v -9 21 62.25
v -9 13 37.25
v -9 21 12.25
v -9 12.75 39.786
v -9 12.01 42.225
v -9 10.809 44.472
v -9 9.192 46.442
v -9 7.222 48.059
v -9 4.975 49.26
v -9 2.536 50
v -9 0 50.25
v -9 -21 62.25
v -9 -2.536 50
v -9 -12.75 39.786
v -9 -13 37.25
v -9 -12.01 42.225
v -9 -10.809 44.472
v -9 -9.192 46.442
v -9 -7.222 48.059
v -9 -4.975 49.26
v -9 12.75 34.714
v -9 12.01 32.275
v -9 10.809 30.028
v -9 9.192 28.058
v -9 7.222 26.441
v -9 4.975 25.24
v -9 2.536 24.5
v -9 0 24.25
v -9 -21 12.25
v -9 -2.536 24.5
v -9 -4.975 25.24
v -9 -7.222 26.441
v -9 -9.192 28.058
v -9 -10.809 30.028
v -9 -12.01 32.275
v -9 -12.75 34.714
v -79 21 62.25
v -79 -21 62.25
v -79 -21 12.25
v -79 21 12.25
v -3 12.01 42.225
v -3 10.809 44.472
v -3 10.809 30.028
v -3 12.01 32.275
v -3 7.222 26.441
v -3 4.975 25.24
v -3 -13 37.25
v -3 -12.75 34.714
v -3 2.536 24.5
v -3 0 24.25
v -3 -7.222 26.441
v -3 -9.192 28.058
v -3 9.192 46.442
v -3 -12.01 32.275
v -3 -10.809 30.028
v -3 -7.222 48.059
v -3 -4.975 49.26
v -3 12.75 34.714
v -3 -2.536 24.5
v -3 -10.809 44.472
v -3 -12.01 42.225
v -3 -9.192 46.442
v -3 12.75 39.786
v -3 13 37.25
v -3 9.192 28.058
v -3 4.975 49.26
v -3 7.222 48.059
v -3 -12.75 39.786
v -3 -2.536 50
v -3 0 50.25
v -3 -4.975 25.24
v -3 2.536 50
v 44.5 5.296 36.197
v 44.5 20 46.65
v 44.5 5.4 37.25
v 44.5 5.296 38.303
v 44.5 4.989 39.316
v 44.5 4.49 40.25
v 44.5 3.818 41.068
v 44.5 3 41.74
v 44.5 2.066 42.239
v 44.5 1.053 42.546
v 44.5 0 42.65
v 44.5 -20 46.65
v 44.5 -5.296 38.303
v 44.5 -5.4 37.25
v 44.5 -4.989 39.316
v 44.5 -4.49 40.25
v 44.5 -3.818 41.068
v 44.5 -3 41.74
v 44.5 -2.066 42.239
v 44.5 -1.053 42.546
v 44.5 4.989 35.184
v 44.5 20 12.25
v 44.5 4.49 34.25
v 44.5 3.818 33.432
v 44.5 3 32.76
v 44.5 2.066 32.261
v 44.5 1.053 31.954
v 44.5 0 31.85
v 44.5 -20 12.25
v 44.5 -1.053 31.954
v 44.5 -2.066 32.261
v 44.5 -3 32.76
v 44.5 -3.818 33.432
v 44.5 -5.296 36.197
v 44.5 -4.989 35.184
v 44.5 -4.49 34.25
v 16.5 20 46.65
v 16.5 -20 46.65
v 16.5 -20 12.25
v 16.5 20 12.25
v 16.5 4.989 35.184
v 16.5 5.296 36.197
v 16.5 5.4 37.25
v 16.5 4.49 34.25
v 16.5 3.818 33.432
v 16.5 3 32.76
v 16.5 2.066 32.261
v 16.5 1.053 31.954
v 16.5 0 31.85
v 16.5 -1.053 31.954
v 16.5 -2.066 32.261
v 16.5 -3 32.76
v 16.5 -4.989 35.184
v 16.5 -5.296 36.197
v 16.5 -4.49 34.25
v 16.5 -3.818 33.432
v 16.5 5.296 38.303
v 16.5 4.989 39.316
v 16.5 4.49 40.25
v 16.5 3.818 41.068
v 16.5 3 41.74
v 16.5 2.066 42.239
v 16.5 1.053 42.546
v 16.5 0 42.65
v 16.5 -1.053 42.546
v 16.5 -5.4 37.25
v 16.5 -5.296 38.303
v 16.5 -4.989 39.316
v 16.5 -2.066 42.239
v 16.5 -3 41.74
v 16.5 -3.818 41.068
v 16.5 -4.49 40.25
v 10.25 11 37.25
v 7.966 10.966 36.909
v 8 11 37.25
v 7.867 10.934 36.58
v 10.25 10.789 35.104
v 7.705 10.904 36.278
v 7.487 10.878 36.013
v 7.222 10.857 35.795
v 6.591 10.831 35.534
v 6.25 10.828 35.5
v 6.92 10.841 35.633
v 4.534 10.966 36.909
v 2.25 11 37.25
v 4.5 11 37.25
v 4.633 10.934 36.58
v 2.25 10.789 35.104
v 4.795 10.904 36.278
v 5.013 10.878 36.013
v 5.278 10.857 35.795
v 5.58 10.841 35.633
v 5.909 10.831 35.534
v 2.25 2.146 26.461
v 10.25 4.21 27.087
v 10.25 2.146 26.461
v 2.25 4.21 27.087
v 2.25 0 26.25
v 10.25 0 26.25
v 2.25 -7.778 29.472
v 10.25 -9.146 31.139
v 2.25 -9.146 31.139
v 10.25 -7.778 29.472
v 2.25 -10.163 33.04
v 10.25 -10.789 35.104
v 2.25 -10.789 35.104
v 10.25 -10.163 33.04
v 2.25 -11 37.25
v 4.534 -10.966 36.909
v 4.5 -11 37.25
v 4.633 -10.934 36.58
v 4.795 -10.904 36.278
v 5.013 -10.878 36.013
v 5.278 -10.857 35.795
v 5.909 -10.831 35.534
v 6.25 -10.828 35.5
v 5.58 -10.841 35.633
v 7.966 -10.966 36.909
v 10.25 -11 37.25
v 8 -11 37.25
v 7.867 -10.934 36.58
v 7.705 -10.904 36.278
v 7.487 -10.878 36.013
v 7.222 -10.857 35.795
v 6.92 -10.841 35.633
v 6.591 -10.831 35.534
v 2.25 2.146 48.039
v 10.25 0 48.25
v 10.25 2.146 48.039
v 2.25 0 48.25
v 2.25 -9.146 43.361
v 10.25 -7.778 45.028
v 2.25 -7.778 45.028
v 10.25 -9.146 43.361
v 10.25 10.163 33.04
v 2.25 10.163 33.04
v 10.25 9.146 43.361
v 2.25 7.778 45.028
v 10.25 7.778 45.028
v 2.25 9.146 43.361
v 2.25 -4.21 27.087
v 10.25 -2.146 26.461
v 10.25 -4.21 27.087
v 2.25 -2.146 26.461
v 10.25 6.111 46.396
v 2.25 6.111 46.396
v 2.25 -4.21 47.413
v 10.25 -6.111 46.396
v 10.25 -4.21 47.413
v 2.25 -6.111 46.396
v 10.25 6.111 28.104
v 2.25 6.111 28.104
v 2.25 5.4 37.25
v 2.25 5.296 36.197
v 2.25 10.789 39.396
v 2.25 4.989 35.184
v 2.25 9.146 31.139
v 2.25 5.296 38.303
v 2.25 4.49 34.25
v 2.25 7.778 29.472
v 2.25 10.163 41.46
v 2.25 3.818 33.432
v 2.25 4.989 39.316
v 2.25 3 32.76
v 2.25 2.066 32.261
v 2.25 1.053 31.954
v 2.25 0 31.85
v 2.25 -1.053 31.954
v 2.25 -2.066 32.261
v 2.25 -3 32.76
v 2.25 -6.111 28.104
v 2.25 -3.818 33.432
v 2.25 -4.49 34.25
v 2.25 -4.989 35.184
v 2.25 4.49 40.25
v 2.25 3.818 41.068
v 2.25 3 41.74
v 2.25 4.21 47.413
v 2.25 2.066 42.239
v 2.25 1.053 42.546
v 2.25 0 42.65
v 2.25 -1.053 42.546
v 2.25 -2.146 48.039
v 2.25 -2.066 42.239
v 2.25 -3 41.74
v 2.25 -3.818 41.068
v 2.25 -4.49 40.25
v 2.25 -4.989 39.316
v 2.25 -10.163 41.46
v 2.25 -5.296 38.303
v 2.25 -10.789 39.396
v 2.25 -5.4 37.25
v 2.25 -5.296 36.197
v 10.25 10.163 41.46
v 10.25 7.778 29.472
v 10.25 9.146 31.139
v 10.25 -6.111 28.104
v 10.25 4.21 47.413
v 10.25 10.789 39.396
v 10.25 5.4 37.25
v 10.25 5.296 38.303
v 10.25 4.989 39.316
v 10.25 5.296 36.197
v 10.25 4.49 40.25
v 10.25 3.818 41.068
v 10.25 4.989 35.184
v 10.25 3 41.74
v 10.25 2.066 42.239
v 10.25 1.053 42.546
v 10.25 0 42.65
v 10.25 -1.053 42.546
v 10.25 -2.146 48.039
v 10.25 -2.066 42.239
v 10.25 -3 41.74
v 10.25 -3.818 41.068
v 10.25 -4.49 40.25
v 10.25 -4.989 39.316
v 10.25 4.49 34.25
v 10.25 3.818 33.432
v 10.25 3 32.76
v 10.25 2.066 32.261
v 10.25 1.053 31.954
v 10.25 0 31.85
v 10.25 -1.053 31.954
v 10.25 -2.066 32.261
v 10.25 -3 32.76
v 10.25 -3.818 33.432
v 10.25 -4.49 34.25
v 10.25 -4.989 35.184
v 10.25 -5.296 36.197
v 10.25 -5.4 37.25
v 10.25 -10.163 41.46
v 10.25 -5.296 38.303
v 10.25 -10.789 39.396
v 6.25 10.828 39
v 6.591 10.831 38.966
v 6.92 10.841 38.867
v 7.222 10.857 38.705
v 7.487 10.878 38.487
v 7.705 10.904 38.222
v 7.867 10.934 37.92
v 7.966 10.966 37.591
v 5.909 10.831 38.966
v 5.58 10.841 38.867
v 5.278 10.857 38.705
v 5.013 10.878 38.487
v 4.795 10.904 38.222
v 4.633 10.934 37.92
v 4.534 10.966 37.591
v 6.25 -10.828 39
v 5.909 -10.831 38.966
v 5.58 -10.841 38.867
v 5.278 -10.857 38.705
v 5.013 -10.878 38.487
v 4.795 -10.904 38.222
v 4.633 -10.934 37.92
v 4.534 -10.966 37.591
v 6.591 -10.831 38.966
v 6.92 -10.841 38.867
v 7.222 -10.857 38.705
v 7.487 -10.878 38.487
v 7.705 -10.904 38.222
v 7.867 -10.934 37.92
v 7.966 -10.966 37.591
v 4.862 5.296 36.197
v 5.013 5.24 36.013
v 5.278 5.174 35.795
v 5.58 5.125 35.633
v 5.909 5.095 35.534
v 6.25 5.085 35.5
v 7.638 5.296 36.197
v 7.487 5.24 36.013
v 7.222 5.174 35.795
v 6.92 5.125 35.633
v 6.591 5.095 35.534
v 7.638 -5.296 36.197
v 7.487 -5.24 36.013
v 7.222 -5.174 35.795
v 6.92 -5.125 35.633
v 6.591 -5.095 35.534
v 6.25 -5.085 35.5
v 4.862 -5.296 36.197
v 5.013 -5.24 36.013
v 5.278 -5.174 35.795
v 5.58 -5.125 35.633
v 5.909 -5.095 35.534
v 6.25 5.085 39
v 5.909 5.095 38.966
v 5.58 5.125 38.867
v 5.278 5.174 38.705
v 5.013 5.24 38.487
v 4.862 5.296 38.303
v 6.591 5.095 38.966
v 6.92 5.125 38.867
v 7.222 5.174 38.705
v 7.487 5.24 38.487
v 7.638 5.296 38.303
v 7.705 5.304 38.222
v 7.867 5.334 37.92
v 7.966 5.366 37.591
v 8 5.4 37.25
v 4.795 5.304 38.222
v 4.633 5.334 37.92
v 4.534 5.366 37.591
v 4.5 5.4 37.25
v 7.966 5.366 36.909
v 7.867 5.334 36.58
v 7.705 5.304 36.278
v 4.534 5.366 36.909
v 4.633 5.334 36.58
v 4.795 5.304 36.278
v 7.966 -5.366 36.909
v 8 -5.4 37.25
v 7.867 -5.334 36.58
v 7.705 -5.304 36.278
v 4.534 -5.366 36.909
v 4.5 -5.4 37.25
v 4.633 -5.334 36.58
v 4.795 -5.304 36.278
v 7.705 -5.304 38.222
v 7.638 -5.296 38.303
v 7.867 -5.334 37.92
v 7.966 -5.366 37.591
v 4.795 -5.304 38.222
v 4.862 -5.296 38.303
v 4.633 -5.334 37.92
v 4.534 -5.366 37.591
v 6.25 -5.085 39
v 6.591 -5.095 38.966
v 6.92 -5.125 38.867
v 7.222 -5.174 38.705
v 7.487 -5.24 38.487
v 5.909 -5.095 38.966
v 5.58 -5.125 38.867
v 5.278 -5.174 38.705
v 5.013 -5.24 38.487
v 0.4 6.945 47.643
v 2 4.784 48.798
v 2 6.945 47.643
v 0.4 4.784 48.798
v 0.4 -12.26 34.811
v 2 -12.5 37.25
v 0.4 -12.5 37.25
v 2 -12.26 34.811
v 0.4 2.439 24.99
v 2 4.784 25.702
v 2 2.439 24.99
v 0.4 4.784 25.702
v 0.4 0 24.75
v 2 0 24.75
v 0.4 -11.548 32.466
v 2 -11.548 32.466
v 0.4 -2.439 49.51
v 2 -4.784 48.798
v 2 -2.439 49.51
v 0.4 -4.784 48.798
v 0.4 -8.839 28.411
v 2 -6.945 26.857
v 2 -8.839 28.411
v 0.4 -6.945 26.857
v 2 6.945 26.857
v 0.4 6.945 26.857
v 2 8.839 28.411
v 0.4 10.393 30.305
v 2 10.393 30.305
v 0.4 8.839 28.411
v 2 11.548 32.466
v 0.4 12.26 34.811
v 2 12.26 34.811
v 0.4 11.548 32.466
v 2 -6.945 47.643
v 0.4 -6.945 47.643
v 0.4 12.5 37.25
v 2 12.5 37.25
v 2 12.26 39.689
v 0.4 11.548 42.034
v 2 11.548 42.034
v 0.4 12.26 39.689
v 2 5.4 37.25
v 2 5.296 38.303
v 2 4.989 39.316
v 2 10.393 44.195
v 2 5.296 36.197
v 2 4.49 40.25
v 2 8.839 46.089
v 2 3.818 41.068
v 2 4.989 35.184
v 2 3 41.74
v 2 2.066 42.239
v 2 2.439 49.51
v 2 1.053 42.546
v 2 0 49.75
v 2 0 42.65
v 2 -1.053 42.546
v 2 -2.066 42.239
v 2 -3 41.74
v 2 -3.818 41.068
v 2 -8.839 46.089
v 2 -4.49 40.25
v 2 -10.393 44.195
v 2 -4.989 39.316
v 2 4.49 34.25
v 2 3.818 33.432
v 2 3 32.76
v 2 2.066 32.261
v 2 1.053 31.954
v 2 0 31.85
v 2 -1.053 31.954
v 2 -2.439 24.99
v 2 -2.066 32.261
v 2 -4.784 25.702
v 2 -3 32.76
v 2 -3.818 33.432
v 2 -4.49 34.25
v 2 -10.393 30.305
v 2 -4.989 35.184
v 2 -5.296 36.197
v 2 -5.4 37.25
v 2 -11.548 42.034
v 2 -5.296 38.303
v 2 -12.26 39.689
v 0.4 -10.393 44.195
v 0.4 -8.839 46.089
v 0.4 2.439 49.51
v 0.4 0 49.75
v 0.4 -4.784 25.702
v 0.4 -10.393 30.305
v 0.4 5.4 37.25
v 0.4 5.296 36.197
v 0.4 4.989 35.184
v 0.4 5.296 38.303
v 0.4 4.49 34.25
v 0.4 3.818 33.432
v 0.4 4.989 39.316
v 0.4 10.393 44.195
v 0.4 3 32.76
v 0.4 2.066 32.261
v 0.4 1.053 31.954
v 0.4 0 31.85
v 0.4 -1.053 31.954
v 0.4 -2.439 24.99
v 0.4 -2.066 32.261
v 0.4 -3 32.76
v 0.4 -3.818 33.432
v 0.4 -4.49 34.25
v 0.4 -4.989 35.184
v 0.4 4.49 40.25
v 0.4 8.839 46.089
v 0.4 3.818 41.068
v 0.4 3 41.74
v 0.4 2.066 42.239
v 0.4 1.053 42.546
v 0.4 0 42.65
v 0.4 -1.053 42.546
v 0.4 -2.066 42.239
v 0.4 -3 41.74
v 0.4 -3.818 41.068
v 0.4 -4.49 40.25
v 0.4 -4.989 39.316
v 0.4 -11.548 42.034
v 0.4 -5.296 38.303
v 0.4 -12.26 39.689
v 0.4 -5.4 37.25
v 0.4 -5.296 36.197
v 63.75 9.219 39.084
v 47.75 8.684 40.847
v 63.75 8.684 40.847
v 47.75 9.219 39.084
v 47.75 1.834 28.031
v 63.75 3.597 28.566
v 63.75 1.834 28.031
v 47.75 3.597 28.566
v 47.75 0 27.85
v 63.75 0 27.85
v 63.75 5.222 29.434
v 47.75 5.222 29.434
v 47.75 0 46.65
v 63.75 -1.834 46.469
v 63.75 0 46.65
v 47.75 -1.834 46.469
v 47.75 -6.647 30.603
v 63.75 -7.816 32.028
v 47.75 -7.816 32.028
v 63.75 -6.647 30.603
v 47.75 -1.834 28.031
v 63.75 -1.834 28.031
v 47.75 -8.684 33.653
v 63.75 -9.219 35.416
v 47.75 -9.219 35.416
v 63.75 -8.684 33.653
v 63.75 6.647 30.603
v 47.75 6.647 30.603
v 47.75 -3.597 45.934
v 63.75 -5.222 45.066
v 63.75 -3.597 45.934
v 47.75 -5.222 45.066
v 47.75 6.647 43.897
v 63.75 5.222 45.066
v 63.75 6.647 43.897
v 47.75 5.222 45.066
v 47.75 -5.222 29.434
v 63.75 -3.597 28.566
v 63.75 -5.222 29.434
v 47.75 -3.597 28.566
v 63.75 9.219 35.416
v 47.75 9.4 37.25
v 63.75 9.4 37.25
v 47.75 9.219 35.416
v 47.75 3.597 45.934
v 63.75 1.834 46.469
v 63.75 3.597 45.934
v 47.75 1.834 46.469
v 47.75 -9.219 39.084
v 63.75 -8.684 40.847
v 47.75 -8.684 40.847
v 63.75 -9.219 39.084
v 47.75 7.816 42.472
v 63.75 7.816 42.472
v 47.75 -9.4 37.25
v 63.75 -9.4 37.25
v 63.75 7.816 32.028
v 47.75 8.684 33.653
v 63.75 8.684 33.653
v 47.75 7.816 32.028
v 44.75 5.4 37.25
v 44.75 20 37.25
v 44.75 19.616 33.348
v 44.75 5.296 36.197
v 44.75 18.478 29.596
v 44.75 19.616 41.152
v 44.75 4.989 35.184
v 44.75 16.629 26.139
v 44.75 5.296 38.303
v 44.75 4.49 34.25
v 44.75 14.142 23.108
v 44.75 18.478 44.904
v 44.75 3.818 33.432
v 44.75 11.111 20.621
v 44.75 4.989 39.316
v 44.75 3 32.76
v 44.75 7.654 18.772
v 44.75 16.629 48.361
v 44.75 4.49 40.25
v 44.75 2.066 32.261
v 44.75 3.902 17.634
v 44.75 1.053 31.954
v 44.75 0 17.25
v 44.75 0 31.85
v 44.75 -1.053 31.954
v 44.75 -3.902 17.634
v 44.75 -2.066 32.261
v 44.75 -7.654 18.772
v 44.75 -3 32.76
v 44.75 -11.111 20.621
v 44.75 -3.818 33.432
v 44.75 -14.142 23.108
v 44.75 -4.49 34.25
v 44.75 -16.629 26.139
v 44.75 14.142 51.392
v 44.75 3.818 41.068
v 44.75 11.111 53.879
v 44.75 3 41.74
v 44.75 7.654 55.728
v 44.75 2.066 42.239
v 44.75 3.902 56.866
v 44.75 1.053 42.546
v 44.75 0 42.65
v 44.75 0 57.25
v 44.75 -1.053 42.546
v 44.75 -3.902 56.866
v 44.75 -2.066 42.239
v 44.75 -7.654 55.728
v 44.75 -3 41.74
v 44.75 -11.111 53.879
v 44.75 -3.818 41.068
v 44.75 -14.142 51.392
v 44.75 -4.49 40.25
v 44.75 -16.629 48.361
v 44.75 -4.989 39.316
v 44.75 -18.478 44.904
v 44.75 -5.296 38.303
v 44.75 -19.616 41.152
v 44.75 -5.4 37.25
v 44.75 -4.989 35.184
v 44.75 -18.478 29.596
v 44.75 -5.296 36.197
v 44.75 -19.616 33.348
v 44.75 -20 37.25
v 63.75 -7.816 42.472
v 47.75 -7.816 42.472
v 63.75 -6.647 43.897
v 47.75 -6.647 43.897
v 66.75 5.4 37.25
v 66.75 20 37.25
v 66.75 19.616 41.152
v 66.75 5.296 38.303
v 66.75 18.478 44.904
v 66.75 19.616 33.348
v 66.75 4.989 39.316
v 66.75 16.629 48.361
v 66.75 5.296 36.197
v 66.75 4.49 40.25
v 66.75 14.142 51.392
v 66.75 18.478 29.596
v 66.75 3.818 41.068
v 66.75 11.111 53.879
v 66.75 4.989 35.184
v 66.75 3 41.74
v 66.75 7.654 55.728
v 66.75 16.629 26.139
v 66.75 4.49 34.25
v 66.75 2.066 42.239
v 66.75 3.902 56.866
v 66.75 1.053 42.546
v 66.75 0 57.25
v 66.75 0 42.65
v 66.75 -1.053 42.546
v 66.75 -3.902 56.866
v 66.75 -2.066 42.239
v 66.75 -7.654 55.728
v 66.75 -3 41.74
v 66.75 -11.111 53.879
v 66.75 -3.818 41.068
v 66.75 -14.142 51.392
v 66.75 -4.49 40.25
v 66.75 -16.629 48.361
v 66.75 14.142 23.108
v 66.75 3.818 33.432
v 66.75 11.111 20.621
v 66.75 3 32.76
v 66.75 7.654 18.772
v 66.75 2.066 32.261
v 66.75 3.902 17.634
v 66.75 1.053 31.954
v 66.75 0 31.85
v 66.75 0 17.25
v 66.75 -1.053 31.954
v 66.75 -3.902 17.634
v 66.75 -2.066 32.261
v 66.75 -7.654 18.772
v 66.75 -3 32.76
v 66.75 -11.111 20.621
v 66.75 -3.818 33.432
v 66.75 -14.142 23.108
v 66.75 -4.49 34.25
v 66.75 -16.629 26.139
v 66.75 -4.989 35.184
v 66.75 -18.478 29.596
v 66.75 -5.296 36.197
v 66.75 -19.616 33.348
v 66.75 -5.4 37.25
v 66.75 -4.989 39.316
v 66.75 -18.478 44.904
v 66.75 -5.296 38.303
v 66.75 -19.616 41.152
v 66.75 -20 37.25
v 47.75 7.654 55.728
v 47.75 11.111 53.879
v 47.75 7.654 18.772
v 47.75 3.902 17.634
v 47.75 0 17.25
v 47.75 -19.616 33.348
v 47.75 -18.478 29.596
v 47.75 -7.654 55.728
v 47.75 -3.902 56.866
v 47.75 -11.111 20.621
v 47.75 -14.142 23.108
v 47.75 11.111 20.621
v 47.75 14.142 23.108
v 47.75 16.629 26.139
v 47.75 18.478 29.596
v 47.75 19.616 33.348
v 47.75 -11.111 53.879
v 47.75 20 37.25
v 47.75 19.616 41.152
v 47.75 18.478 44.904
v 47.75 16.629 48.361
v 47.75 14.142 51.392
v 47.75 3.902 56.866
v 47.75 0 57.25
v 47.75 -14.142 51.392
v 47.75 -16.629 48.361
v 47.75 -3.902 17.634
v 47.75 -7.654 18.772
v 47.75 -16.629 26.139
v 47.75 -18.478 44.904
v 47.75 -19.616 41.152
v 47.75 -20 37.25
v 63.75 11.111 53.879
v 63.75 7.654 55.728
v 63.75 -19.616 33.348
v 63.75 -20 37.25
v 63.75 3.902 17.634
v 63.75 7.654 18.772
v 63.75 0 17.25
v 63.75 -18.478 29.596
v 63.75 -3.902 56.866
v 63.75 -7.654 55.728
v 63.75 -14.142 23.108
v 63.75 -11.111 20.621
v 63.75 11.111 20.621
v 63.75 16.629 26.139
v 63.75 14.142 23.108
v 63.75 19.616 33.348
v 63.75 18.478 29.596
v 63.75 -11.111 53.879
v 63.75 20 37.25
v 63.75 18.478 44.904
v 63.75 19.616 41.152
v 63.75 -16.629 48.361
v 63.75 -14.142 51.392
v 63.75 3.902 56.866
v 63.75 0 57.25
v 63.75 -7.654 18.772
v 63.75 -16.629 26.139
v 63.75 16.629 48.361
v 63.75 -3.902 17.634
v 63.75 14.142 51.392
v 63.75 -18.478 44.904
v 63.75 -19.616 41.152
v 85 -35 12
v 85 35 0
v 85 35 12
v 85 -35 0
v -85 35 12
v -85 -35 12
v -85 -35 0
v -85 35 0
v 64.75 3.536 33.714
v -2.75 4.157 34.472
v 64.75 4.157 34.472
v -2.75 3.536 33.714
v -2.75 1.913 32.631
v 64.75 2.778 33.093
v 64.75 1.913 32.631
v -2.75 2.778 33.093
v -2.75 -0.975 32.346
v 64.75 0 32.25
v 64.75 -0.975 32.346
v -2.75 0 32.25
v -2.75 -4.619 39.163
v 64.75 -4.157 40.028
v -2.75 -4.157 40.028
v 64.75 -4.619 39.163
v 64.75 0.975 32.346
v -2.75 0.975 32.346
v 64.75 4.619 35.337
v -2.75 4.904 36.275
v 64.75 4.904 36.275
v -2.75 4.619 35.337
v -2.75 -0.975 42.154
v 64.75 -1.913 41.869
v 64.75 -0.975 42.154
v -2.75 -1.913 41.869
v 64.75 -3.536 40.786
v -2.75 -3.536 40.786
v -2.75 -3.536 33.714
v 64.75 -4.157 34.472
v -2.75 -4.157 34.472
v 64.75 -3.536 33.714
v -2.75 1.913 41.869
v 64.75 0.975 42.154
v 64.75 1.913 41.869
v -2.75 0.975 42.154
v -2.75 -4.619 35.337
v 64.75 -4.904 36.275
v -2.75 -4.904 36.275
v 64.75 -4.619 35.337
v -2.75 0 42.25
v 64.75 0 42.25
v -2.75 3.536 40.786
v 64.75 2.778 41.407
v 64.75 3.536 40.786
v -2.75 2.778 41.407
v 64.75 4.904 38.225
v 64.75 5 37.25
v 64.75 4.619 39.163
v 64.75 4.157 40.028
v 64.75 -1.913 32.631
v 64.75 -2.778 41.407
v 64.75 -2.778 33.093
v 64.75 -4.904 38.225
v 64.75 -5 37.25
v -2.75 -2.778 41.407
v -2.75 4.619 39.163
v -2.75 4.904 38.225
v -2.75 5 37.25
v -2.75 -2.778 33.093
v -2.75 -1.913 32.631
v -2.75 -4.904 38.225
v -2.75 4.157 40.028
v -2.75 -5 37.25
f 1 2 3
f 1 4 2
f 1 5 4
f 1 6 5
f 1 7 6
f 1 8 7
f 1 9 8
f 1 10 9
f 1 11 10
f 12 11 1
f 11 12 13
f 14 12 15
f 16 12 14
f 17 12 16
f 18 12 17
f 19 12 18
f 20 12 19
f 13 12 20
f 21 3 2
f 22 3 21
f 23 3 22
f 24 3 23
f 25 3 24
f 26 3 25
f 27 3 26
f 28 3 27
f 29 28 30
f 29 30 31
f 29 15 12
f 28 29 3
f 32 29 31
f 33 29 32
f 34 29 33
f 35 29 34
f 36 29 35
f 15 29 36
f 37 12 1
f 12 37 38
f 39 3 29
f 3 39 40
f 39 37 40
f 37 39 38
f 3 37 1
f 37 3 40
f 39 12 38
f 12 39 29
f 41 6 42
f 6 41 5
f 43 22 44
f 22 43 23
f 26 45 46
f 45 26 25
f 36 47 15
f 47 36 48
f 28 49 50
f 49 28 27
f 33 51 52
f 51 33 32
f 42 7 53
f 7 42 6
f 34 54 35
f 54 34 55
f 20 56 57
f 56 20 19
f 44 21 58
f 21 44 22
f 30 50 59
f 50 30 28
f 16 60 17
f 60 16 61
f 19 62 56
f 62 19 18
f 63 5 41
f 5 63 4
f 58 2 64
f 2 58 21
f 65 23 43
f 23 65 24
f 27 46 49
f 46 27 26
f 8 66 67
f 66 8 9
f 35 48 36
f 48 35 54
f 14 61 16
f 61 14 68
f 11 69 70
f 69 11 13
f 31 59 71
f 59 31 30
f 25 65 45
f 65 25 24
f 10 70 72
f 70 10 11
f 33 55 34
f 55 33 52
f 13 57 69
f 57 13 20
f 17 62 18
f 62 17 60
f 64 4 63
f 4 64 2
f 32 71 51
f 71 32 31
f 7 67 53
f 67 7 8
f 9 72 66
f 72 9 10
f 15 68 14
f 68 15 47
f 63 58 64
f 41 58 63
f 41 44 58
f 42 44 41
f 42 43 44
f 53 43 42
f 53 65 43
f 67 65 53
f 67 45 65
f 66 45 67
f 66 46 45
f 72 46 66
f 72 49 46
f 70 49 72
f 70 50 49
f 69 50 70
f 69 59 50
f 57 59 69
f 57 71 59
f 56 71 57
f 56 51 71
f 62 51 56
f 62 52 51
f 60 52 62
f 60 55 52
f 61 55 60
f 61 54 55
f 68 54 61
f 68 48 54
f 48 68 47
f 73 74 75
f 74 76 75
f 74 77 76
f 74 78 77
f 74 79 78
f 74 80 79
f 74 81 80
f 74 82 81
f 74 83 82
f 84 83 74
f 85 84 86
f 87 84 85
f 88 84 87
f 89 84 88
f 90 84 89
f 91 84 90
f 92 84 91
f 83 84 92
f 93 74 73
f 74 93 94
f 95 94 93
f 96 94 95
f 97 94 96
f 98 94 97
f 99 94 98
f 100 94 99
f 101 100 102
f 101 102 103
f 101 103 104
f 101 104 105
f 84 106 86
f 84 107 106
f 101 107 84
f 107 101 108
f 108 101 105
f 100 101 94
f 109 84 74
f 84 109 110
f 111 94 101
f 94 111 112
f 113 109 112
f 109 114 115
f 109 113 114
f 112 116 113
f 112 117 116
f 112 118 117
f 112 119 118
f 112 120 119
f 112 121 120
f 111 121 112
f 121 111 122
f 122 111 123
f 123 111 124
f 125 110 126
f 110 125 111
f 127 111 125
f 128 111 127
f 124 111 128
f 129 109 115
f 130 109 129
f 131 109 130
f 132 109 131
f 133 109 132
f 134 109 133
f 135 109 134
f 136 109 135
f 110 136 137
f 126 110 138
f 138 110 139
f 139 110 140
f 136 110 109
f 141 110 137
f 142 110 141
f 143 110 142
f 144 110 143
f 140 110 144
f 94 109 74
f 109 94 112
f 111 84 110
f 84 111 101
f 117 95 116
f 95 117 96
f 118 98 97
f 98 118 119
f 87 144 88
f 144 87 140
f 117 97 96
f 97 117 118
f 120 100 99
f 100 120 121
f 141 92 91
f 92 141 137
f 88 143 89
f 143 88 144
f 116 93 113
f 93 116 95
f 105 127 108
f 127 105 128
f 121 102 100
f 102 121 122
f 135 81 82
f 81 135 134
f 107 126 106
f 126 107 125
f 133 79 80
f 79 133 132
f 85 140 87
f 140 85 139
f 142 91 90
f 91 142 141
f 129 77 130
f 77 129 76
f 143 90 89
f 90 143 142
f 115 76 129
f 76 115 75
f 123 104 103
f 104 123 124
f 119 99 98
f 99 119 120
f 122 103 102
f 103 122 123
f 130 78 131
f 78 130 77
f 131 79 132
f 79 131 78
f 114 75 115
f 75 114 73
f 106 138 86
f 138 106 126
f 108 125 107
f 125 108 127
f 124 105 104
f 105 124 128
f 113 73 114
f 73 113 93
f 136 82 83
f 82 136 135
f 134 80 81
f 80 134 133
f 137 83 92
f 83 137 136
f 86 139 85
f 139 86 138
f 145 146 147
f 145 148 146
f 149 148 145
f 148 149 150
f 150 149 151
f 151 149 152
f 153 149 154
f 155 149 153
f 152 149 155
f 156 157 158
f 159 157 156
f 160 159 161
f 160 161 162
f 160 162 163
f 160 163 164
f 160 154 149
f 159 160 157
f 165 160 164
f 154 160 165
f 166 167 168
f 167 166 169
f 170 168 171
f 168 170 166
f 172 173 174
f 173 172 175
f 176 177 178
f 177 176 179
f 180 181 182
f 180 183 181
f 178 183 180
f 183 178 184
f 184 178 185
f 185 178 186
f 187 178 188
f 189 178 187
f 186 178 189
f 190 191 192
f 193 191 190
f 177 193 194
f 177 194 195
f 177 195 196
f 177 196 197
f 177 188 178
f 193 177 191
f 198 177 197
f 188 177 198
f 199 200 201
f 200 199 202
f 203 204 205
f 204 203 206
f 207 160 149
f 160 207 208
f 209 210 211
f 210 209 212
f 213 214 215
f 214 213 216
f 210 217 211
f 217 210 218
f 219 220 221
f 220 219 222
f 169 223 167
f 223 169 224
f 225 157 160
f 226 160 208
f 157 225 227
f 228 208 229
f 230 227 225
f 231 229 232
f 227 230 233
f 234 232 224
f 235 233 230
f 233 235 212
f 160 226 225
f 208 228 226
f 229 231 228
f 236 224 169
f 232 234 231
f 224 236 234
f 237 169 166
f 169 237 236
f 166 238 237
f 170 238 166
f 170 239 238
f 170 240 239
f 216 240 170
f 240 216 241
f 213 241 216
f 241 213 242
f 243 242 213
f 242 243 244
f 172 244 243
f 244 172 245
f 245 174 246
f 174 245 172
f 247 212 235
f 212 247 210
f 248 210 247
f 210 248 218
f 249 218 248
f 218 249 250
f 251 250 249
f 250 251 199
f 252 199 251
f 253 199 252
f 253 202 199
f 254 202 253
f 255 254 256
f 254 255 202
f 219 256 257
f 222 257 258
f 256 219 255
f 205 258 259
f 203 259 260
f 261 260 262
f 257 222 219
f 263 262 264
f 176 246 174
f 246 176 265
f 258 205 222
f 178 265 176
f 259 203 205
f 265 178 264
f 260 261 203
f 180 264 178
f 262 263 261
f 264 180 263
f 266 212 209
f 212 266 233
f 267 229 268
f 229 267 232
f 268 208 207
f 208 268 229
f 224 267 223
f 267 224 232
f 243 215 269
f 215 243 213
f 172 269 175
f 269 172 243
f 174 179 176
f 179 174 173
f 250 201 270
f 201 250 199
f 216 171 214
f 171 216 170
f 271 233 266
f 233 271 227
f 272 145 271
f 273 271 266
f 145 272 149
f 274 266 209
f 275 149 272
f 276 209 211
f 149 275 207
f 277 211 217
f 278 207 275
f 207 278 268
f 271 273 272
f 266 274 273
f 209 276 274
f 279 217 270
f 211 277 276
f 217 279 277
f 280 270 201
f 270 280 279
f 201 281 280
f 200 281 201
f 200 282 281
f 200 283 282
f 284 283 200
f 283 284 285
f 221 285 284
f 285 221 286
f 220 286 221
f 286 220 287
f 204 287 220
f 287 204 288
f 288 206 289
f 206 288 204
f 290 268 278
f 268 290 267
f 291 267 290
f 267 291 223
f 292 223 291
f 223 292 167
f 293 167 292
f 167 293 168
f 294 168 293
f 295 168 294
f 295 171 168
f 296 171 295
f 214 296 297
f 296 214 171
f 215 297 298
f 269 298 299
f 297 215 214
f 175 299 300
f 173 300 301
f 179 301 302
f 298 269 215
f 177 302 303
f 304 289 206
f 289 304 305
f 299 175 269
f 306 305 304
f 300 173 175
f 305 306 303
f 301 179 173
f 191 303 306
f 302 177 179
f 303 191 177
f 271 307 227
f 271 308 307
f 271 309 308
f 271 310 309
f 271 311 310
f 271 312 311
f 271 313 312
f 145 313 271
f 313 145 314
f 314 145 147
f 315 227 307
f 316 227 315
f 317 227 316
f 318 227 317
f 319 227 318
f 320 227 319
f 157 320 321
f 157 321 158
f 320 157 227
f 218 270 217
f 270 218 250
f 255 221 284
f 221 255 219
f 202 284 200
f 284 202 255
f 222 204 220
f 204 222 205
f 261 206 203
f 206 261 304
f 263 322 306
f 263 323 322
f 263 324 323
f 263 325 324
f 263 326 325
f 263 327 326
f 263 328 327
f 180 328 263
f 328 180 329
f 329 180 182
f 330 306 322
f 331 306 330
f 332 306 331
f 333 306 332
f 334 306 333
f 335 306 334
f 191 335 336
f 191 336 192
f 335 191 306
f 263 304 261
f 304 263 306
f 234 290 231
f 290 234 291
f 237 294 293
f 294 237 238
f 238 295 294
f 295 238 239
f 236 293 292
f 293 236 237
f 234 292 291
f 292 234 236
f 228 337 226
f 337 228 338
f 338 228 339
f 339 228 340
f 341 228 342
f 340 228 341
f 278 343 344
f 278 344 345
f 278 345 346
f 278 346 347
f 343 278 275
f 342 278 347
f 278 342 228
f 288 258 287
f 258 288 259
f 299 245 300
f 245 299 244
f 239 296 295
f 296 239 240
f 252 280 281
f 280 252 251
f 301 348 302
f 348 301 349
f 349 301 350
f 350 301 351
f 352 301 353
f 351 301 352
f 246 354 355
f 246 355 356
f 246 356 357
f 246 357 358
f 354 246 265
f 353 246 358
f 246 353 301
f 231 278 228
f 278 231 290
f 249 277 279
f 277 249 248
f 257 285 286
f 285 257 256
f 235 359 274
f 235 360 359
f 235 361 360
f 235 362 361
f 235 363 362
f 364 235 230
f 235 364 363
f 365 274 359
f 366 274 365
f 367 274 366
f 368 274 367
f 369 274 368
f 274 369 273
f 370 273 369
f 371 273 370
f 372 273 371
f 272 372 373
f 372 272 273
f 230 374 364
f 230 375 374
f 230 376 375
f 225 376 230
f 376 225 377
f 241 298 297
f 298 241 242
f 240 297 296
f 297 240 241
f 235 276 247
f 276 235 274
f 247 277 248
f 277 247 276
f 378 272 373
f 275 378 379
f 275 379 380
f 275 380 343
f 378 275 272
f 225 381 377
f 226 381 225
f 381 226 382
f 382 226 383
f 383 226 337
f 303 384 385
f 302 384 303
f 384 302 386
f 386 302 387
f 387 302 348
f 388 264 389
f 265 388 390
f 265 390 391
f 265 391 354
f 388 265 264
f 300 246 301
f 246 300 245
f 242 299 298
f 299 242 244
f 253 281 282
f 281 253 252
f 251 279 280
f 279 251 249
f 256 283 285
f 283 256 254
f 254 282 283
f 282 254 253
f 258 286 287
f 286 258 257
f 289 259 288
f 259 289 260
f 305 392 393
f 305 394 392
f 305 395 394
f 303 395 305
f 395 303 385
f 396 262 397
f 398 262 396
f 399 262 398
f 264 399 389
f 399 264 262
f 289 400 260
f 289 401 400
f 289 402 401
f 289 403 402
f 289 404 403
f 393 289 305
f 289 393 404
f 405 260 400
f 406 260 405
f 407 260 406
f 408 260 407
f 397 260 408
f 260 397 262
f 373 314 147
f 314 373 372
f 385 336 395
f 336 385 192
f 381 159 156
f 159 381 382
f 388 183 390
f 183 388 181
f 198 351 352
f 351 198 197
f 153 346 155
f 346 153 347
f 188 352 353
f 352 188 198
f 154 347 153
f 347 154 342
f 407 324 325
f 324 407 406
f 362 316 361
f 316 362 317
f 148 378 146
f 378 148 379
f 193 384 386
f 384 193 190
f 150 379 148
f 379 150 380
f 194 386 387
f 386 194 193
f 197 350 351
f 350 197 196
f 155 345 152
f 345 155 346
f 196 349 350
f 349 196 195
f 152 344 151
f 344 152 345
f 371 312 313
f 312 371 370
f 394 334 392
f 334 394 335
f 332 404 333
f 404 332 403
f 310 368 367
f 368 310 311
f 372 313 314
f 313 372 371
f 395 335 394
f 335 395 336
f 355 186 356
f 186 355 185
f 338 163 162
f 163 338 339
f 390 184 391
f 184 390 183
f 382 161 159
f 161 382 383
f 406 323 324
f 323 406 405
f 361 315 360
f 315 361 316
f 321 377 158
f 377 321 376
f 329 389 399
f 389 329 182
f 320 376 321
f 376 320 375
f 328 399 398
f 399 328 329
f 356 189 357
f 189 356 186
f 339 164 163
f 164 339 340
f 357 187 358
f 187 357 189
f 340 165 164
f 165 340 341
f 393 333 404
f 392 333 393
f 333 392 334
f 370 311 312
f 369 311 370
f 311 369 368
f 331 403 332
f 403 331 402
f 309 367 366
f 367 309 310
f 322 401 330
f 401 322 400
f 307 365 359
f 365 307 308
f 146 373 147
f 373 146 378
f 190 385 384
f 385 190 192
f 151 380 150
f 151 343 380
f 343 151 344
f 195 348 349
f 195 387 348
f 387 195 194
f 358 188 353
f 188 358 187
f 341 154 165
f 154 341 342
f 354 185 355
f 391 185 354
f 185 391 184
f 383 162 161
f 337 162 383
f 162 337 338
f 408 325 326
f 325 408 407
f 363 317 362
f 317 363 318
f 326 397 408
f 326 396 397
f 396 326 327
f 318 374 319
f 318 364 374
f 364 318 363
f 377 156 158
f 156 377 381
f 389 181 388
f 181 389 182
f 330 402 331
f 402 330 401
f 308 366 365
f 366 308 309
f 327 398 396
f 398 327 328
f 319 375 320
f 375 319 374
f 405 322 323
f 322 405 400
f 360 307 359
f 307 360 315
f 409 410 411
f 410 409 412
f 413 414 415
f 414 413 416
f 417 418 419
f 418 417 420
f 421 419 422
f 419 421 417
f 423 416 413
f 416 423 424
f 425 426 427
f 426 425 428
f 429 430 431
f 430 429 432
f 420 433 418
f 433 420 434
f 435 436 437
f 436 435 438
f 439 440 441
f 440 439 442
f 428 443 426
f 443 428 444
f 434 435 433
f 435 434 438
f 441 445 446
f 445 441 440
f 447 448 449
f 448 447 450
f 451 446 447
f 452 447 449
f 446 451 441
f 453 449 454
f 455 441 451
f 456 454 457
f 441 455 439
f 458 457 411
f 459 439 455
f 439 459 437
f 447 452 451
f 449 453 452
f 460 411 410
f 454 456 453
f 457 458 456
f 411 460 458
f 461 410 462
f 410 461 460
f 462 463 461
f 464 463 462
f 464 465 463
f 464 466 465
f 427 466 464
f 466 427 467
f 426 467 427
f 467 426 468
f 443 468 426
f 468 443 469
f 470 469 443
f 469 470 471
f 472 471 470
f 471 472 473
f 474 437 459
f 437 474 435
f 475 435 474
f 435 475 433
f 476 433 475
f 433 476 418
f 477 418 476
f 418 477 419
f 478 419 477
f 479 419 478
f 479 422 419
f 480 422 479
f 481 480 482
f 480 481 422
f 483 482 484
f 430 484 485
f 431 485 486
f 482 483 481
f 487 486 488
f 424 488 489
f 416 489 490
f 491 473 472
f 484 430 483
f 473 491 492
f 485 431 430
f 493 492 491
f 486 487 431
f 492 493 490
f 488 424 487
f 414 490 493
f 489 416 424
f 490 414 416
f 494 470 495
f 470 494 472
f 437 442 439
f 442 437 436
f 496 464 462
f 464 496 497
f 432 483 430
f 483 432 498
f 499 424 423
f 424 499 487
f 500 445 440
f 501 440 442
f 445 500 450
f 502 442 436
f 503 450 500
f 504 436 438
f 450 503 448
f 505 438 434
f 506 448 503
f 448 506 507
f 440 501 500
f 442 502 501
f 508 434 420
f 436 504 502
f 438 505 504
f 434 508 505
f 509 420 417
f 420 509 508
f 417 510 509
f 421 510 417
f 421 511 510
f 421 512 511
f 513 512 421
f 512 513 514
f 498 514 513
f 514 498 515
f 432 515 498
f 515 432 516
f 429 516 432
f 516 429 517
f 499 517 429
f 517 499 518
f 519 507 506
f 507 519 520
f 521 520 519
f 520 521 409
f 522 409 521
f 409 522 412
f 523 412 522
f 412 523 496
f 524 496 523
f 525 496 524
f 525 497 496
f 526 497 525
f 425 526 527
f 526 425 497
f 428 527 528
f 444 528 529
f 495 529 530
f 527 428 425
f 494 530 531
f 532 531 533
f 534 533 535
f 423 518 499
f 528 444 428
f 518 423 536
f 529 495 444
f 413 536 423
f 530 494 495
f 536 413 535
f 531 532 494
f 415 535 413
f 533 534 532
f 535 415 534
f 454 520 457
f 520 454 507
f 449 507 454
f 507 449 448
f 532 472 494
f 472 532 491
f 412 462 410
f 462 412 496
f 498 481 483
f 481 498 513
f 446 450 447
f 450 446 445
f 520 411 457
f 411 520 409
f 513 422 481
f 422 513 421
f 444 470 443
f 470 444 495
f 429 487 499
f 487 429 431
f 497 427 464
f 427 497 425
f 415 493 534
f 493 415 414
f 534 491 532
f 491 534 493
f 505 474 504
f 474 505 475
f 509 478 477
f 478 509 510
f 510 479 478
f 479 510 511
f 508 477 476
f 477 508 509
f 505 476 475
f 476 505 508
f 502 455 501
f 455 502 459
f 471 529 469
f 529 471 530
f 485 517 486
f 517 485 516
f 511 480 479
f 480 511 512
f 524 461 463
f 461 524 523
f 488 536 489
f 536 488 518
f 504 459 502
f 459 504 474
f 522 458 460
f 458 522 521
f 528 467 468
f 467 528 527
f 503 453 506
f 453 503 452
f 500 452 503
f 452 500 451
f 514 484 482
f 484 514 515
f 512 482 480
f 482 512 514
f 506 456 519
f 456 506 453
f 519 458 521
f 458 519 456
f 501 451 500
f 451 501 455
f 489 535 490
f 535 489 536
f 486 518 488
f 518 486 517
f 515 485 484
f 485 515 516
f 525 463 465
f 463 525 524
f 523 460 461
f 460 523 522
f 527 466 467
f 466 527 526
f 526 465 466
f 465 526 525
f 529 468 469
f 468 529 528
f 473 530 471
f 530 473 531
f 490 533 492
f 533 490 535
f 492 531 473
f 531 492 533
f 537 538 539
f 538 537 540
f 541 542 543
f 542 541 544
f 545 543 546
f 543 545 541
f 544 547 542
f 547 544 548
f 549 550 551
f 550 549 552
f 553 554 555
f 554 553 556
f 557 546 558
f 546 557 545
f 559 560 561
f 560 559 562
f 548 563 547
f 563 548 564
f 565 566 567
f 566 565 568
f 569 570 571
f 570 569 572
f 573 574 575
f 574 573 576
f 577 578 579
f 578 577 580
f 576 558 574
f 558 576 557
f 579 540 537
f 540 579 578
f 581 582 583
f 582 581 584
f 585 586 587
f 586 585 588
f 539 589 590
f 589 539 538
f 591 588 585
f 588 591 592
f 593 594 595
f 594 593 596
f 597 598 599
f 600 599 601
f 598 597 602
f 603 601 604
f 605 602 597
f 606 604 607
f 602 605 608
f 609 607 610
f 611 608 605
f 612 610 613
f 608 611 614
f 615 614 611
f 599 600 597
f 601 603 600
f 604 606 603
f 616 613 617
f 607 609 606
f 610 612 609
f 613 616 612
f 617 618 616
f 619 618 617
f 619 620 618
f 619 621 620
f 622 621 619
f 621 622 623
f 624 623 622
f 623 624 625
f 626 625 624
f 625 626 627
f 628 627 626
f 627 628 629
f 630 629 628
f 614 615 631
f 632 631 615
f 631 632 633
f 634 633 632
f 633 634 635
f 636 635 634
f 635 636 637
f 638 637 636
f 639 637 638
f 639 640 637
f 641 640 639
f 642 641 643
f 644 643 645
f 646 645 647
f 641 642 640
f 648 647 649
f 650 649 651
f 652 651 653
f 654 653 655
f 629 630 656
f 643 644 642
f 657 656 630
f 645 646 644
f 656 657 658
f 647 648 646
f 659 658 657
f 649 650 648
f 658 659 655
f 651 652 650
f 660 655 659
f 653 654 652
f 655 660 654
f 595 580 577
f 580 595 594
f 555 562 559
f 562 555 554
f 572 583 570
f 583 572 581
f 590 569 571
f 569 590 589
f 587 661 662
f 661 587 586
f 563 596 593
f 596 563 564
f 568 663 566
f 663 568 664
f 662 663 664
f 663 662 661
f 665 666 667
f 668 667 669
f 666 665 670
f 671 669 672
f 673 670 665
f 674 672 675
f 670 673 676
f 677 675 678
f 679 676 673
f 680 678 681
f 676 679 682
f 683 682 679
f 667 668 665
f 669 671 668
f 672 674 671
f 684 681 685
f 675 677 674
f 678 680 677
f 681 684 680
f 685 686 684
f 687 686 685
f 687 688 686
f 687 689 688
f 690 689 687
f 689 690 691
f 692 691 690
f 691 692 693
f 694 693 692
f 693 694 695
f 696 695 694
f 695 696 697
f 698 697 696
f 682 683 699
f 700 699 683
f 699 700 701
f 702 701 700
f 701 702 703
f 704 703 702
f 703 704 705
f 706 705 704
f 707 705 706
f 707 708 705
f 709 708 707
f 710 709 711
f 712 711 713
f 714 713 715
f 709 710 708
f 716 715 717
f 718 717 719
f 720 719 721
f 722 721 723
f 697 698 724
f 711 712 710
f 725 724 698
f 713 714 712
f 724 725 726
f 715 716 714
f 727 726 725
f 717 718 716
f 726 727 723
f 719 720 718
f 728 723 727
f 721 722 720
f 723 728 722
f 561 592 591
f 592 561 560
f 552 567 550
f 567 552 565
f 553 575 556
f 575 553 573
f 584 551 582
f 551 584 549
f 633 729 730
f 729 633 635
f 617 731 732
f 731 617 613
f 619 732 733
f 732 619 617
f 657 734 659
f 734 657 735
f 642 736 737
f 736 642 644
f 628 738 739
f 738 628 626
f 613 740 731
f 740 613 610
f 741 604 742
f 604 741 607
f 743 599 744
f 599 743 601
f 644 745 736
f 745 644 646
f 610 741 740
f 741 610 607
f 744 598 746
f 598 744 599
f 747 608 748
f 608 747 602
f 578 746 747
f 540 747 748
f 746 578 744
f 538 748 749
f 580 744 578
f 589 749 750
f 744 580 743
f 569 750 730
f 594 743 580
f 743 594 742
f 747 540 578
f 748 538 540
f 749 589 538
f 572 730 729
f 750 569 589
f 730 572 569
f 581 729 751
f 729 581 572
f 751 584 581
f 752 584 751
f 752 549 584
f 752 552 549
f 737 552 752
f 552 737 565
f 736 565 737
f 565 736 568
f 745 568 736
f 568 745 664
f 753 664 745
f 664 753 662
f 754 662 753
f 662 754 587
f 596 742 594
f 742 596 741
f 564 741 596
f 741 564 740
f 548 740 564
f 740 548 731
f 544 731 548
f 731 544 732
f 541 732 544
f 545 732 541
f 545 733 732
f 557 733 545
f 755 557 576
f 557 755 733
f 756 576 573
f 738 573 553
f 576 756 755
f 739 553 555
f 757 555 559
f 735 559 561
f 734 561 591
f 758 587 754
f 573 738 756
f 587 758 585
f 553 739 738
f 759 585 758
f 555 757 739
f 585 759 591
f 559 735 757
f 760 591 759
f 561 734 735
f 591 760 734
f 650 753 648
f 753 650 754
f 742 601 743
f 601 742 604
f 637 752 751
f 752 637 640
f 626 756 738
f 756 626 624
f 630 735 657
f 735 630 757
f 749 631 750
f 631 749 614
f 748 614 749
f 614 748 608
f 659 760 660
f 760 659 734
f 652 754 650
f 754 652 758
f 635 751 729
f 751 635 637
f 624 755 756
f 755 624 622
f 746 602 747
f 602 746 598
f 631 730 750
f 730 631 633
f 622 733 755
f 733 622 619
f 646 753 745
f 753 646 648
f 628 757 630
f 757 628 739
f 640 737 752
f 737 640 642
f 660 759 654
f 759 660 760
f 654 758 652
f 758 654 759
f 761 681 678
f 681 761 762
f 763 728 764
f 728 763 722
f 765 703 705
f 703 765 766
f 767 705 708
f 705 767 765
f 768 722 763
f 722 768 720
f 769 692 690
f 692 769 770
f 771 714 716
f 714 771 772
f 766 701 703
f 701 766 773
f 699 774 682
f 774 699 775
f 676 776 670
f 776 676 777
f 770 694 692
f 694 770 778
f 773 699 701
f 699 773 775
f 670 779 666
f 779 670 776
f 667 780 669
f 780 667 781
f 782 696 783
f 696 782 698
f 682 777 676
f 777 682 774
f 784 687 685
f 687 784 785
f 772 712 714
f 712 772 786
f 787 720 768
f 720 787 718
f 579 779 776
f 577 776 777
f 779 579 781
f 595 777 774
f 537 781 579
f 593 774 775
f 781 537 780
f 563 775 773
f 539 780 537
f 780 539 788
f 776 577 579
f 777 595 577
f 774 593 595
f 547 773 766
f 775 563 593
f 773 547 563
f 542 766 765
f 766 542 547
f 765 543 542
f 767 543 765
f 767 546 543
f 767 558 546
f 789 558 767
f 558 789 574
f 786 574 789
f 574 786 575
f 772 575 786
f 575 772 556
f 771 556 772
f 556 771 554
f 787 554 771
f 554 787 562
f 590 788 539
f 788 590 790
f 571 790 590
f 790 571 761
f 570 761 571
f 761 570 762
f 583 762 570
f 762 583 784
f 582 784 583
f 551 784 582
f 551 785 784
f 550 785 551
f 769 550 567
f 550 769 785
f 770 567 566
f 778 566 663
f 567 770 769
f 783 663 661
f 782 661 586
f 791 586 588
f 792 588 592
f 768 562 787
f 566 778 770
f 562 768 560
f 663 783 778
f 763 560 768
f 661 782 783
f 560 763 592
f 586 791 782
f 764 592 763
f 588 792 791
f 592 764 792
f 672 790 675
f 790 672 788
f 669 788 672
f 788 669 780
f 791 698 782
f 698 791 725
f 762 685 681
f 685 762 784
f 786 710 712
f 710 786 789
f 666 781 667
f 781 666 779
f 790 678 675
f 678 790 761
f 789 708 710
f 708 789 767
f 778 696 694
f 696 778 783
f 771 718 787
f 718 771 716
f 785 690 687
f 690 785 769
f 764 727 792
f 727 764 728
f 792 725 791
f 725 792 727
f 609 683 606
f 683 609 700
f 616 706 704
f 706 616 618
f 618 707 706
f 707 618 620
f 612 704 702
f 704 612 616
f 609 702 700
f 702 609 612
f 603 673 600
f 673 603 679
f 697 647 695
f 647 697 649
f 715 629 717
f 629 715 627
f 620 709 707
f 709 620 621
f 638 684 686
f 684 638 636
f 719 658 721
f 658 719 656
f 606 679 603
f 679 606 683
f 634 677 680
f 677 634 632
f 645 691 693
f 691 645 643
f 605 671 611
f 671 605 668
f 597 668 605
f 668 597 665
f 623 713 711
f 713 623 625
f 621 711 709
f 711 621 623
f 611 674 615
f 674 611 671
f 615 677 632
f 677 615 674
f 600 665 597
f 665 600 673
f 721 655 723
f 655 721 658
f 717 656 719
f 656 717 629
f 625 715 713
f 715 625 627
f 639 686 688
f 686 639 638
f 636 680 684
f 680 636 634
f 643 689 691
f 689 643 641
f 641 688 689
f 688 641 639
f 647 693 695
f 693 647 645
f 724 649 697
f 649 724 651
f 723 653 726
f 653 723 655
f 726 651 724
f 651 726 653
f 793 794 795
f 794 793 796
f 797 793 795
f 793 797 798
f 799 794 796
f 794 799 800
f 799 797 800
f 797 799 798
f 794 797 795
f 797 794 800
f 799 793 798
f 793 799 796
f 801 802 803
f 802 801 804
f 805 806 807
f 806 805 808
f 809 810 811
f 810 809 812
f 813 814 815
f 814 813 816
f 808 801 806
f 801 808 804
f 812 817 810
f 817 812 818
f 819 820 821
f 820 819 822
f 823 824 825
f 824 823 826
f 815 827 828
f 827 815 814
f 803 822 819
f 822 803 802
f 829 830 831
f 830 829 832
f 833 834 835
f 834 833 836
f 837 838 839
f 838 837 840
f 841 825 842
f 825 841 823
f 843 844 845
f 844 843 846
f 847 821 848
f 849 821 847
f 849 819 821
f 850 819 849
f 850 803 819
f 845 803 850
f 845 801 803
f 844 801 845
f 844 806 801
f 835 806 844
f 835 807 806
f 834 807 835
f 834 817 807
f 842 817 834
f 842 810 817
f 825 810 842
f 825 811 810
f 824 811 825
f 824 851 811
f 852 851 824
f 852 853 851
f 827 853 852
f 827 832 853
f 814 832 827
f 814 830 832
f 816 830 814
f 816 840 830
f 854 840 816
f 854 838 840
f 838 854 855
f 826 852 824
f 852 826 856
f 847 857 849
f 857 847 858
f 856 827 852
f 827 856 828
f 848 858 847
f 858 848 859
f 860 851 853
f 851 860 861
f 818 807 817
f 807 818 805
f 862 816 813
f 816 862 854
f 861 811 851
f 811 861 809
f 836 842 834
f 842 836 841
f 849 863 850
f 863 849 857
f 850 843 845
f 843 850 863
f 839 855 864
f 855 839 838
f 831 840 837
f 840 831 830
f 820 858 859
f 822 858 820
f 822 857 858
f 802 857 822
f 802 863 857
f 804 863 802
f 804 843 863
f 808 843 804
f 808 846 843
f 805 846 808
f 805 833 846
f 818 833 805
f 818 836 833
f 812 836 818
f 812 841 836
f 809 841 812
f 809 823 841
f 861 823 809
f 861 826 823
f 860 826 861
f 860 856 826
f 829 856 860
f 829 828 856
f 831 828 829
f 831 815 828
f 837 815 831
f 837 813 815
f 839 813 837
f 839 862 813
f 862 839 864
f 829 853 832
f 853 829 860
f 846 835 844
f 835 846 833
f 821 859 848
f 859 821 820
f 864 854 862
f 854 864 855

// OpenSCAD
$fn = 32;

// ------------------------------------------------------------------------
// Motor drive station: motor 70 x 50 mm, shaft d10, pulley d40
// Every part is its own module, assembly() places every instance.
// ------------------------------------------------------------------------

// --- part 1 ---
module station_bed() {
  difference() {
    translate([-85, -35, 0]) cube([170, 70, 12]);
  }
}

// --- part 2 ---
module drive_motor() {
  union() {
    translate([-35, -21, 0]) cube([70, 42, 50]);
    translate([38, 0, 25]) rotate([0, 90, 0]) cylinder(h = 6, d = 26, center = true);
  }
}

// --- part 3 ---
module pillow_block() {
  difference() {
    translate([-14, -20, 0]) cube([28, 40, 34.4]);
    translate([0, 0, 25]) rotate([0, 90, 0]) cylinder(h = 30, d = 10.8, center = true);
  }
}

// --- part 4 ---
module drive_shaft() {
  translate([0, 0, -33.75]) cylinder(h = 67.5, d = 10);
}

// --- part 5 ---
module shaft_collar() {
  difference() {
    cylinder(h = 8, d = 22);
    translate([0, 0, -1]) cylinder(h = 10, d = 10.8);
    translate([0, 0, 4]) rotate([90, 0, 0]) cylinder(h = 24, d = 3.5, center = true);
  }
}

// --- part 6 ---
module collar_washer() {
  difference() {
      translate([0, 0, 0]) cylinder(h = 1.6, d = 25);
      translate([0, 0, -1]) cylinder(h = 3.6, d = 10.8);
    }
}

// --- part 7 ---
module drive_pulley() {
  difference() {
    union() {
      cylinder(h = 22, d = 18.8);
      cylinder(h = 3, d = 40);
      translate([0, 0, 19]) cylinder(h = 3, d = 40);
    }
    translate([0, 0, -1]) cylinder(h = 24, d = 10.8);
  }
}

// --- assembly ---
module assembly() {
  color([0.80, 0.24, 0.20]) translate([0, 0, 0]) rotate([0, 0, 0]) station_bed();
  color([0.20, 0.45, 0.75]) translate([-44, 0, 12.25]) rotate([0, 0, 0]) drive_motor();
  color([0.25, 0.62, 0.32]) translate([30.5, 0, 12.25]) rotate([0, 0, 0]) pillow_block();
  color([0.92, 0.70, 0.18]) translate([31, 0, 37.25]) rotate([0, 90, 0]) drive_shaft();
  color([0.58, 0.35, 0.70]) translate([2.25, 0, 37.25]) rotate([0, 90, 0]) shaft_collar();
  color([0.16, 0.66, 0.66]) translate([0.4, 0, 37.25]) rotate([0, 90, 0]) collar_washer();
  color([0.85, 0.48, 0.18]) translate([44.75, 0, 37.25]) rotate([0, 90, 0]) drive_pulley();
}

assembly();
